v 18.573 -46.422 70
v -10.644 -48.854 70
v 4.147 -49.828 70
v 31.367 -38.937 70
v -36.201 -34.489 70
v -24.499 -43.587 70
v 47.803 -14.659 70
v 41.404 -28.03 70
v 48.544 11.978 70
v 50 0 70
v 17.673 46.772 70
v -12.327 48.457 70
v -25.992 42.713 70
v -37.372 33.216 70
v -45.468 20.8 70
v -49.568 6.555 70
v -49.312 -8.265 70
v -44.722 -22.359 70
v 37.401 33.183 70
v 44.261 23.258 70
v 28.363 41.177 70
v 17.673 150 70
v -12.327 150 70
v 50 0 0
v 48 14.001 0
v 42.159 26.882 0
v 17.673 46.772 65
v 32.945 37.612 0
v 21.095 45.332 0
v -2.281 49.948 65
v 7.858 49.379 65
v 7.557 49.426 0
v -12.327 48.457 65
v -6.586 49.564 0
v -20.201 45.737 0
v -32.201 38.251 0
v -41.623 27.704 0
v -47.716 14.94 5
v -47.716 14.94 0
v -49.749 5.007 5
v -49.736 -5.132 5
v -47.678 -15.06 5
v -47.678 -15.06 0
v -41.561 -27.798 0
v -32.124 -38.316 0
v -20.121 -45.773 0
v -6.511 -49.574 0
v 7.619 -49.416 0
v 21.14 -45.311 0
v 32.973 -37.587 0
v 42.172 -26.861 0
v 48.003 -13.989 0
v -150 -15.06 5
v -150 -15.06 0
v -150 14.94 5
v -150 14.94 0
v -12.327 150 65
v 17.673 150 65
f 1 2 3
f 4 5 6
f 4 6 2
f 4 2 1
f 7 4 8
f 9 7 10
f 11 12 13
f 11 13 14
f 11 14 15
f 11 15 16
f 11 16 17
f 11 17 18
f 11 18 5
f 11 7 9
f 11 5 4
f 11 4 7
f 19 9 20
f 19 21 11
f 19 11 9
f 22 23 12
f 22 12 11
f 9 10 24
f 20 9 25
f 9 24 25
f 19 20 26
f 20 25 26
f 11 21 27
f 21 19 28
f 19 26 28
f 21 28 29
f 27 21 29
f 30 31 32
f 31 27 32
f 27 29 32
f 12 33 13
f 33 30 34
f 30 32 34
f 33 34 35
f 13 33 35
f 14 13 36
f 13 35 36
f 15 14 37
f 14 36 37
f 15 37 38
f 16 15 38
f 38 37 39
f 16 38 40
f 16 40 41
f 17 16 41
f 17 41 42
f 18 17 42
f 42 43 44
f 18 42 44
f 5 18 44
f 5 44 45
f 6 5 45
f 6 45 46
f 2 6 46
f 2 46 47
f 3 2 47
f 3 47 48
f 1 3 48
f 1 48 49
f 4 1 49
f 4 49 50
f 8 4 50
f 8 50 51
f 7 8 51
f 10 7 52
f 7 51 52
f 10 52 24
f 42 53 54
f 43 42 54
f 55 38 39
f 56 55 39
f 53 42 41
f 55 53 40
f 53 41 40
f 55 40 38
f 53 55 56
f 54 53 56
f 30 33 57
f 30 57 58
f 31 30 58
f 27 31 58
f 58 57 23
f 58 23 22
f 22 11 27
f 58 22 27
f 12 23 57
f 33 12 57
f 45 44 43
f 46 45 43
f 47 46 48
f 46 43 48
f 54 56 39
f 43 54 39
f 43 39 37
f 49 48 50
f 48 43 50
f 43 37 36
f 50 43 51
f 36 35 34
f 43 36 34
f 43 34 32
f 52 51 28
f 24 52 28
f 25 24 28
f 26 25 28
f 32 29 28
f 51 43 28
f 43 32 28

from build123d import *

# Parameters (mm, degrees)
SKETCH1_R           = 50
BOSS_EXTRUDE1_DEPTH = 70
SKETCH2_W           = 30
SKETCH2_H           = 5
BOSS_EXTRUDE2_DEPTH = 150
SKETCH4_W           = 5
SKETCH4_H           = 30
BOSS_EXTRUDE3_DEPTH = 150


with BuildPart() as part:
    # Sketch1 → Boss-Extrude1 (new body)
    with BuildSketch(Plane.XY):
        Circle(SKETCH1_R)
    extrude(amount=BOSS_EXTRUDE1_DEPTH)

    # Sketch2 → Boss-Extrude2 (add)
    with BuildSketch(Plane(origin=(0, 0, 0), x_dir=(1, 0, 0), z_dir=(0, 1, 0))):
        with Locations((2.673304283, -67.5)):
            Rectangle(SKETCH2_W, SKETCH2_H)
    extrude(amount=BOSS_EXTRUDE2_DEPTH)

    # Sketch4 → Boss-Extrude3 (add)
    with BuildSketch(Plane(origin=(0, 0, 0), x_dir=(0, 0, -1), z_dir=(1, 0, 0))):
        with Locations((-2.5, -0.059930336)):
            Rectangle(SKETCH4_W, SKETCH4_H)
    extrude(amount=-BOSS_EXTRUDE3_DEPTH)


solid = part.part
